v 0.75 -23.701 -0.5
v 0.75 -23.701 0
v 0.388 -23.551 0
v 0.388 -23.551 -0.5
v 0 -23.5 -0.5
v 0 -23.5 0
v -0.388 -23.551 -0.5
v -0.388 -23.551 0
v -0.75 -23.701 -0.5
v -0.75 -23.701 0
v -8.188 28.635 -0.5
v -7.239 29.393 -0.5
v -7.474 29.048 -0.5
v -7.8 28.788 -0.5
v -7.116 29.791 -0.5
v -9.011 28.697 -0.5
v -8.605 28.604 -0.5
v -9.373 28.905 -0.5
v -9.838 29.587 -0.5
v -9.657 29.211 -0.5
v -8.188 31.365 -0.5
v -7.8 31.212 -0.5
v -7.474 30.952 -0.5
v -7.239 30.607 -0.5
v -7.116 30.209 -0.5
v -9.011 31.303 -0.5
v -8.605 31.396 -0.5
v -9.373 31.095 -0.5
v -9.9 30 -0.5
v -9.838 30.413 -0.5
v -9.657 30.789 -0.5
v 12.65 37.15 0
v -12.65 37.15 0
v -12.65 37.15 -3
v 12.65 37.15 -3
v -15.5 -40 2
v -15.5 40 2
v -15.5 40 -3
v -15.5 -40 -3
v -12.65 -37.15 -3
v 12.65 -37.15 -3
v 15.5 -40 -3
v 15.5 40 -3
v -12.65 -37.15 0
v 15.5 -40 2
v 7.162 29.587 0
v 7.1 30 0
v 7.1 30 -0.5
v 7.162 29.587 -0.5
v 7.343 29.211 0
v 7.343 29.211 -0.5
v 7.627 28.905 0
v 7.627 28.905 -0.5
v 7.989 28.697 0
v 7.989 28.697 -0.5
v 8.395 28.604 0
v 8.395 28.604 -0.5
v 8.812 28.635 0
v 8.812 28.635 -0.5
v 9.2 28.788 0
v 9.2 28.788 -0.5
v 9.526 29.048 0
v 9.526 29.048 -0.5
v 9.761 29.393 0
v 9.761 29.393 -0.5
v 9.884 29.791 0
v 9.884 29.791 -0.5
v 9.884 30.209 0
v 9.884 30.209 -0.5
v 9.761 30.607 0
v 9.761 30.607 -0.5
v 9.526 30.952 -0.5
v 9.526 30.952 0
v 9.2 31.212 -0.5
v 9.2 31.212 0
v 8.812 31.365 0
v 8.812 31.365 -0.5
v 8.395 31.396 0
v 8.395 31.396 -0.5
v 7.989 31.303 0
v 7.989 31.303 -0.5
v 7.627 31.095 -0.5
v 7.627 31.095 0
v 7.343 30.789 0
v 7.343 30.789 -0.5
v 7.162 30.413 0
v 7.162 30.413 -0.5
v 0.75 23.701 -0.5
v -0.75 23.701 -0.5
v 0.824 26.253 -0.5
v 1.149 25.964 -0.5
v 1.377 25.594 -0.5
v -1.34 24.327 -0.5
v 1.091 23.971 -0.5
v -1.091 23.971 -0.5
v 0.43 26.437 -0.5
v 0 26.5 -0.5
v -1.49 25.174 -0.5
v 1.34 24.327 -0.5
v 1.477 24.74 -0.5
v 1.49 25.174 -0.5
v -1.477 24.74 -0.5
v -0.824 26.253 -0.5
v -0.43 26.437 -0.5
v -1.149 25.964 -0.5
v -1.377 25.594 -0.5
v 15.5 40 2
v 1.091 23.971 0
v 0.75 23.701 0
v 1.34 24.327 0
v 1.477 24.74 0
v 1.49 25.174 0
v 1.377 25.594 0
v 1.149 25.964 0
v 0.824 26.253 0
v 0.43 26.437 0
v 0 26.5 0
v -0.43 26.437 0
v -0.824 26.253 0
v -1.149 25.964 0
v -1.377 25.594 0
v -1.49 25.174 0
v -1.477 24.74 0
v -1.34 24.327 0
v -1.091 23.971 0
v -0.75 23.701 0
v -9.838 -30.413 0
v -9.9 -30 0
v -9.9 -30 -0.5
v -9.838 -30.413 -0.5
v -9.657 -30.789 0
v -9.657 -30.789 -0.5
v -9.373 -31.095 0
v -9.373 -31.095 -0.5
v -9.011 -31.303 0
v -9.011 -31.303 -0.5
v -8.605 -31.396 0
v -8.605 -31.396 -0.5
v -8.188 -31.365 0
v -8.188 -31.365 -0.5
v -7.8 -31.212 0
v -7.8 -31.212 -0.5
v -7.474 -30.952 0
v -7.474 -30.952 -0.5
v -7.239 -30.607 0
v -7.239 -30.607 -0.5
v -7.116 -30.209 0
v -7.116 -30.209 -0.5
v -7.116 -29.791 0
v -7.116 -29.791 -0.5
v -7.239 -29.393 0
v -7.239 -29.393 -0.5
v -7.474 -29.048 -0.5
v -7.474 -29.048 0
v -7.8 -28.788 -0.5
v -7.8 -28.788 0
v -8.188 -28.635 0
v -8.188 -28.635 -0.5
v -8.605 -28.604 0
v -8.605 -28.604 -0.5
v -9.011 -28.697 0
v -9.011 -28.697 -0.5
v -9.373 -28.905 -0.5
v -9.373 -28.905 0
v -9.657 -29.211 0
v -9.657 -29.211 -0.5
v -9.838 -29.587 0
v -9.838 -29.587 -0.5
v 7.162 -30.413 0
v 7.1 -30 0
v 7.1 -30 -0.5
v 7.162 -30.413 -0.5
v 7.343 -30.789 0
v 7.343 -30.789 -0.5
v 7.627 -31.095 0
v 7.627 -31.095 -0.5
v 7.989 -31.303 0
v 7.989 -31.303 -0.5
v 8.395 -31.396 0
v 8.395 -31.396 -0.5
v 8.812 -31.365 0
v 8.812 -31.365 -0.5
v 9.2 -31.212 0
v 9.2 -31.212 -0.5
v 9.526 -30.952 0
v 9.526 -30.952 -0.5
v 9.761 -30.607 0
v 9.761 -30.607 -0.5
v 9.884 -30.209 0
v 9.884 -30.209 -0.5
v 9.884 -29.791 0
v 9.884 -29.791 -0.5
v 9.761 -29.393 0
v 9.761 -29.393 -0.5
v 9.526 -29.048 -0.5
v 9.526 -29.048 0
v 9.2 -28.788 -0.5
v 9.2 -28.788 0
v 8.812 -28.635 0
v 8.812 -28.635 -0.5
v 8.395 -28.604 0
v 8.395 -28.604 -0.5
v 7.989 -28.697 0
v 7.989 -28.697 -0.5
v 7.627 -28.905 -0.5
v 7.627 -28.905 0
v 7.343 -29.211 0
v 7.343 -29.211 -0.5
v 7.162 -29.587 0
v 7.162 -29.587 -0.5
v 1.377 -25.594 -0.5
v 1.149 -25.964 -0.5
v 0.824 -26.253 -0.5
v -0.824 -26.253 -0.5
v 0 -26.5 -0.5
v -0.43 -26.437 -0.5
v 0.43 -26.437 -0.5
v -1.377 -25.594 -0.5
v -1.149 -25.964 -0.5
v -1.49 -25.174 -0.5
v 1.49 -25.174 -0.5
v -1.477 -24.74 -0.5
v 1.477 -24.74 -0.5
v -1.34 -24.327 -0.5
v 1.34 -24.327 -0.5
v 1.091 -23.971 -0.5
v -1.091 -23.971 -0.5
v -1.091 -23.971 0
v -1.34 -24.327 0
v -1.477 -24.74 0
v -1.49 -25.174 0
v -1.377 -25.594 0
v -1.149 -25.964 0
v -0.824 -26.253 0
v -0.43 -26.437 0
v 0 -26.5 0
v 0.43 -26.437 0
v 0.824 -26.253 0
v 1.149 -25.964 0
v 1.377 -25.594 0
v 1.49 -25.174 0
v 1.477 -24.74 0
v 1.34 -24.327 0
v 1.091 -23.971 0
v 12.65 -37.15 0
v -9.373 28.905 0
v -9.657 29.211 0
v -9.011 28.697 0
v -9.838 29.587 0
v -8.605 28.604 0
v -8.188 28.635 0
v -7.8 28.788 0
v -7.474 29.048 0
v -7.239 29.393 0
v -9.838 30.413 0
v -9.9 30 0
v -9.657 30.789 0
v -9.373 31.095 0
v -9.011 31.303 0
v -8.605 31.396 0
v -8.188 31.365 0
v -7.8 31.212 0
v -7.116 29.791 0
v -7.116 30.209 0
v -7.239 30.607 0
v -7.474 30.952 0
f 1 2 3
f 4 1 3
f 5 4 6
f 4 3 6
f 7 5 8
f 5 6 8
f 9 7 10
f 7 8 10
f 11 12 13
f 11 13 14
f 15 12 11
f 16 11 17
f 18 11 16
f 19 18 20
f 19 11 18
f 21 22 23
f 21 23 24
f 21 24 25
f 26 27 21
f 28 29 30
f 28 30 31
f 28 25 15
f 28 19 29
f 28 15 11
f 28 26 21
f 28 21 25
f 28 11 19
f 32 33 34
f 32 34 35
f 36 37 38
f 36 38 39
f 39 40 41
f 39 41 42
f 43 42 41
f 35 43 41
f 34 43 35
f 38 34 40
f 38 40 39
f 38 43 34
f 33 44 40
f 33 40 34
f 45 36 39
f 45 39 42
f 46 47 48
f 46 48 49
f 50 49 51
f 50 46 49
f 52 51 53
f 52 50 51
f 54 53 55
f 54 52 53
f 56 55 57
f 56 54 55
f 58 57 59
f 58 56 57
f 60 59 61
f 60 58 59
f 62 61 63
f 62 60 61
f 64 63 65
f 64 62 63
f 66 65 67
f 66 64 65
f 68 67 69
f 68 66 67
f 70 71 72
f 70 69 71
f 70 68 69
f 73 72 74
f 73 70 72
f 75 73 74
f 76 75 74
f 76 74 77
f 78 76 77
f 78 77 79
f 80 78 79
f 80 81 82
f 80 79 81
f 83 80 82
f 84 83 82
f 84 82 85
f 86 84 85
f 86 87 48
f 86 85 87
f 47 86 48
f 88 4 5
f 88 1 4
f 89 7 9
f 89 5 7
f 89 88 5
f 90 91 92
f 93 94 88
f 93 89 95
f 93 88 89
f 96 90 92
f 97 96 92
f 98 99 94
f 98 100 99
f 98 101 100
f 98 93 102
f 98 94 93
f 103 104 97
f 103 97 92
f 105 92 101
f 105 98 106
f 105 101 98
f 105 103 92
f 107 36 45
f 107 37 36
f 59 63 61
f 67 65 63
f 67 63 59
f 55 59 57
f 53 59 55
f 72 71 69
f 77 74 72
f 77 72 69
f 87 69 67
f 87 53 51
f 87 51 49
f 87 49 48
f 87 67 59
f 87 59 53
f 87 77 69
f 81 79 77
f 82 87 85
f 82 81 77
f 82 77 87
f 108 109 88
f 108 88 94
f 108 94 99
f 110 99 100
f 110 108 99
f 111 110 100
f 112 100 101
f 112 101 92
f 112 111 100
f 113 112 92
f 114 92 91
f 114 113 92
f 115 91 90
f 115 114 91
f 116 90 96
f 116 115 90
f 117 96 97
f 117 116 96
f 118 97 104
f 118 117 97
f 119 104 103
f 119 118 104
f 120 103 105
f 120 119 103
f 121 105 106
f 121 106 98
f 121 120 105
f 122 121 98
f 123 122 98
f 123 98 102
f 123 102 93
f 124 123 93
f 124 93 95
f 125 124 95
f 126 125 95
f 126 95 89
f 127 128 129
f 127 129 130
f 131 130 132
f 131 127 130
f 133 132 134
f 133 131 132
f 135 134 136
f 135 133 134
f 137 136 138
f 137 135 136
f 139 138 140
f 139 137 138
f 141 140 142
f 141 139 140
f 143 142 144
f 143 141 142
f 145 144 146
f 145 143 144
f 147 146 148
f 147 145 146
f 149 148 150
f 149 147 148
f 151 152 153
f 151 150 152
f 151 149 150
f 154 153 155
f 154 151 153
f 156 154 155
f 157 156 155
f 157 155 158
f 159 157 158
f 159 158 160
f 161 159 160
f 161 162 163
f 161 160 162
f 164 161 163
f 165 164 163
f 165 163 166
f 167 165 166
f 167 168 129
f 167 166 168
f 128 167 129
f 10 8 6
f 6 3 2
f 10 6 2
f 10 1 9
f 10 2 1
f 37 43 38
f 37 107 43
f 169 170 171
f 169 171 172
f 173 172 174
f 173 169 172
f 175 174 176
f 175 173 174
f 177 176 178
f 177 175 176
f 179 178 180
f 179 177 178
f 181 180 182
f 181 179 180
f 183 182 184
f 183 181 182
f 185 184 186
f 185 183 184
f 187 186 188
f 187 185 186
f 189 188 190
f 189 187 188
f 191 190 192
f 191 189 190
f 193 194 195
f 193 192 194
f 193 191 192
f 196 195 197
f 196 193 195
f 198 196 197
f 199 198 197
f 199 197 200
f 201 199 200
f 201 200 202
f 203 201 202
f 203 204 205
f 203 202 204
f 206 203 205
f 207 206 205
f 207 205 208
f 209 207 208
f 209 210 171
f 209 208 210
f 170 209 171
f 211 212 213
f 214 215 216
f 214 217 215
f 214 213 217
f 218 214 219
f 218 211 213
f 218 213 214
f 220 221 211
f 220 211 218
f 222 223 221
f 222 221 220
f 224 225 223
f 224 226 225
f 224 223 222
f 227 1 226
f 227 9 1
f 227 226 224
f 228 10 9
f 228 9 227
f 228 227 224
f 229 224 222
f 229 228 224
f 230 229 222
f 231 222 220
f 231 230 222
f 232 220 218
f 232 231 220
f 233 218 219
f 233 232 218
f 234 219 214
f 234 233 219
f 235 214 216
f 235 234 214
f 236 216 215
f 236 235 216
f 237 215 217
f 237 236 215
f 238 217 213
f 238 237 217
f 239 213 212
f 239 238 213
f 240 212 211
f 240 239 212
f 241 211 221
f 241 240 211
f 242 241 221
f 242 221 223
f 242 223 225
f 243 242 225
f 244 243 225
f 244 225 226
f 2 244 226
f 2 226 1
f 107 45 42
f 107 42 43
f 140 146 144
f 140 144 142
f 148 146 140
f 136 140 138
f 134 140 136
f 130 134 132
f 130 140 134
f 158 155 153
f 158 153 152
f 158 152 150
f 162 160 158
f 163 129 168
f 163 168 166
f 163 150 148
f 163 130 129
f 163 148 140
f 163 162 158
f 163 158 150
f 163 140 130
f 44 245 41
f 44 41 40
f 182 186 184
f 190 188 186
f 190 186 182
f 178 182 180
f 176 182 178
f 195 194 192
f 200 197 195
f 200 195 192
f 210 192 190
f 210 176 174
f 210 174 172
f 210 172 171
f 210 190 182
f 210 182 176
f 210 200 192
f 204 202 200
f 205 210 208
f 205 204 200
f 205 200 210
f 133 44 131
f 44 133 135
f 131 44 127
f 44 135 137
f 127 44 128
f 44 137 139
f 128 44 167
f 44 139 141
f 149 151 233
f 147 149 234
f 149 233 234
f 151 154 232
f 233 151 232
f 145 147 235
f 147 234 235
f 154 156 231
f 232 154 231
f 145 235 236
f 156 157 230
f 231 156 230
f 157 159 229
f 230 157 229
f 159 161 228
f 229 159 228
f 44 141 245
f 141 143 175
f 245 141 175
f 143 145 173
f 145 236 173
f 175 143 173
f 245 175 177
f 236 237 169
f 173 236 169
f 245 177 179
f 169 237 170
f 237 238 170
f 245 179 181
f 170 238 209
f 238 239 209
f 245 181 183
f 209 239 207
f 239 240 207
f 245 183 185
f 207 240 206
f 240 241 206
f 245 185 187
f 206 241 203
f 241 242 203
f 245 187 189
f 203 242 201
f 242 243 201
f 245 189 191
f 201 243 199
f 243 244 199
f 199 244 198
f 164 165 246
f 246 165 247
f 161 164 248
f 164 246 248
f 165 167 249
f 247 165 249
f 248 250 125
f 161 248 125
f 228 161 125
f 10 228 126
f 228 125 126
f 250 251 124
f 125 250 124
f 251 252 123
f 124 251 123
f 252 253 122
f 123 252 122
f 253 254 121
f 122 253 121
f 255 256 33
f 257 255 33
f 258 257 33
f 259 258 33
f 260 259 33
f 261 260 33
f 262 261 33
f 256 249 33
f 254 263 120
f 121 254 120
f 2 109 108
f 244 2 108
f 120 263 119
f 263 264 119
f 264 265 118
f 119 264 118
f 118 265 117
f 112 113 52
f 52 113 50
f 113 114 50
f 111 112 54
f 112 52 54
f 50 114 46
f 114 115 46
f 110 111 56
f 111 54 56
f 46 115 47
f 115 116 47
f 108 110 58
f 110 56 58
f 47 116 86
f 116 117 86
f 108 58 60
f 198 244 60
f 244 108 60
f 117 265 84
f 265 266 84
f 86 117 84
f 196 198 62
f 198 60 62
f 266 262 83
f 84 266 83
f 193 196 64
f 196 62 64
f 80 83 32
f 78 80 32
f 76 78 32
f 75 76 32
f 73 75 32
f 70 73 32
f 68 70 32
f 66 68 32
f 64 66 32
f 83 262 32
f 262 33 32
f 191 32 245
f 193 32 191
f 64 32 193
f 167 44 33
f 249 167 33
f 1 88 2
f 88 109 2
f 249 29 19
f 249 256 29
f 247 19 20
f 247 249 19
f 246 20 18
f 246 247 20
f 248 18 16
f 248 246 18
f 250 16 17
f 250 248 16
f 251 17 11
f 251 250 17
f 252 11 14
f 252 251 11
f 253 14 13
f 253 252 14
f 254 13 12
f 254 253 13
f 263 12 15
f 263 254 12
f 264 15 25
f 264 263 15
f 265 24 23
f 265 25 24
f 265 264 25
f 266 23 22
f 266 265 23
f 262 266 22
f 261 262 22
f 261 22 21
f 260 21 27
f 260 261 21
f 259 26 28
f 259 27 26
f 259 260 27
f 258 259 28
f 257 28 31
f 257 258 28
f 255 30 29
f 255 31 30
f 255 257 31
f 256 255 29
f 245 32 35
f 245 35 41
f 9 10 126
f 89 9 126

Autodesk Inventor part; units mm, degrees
ref_plane "YZ Plane" through (0, 0, 0) normal (1, 0, 0) x (0, 1, 0)
ref_plane "XZ Plane" through (0, 0, 0) normal (0, 1, 0) x (-1, 0, 0)
ref_plane "Arbeitsebene1" through (0, 0, 0) normal (0, 0, 1) x (1, 0, 0)
sketch "Skizze1" plane through (0, 0, 0) normal (0, 0, 1) x (1, 0, 0)
  line L0 (12.5, -37) -> (-12.5, -37) projected
  line L1 (12.5, 37) -> (12.5, -37) projected
  line L2 (-12.5, 37) -> (12.5, 37) projected
  line L3 (-12.5, -37) -> (-12.5, 37) projected
  circle A0 centre (-8.5, -30) radius 1.4 projected
  circle A1 centre (8.5, -30) radius 1.4 projected
  circle A2 centre (8.5, 30) radius 1.4 projected
  circle A3 centre (-8.5, 30) radius 1.4 projected
  line L4 (-0.75, 23.146) -> (-0.75, -23.146) projected
  arc A4 (0.75, 23.146) -> (-0.75, 23.146) centre (0, 25) ccw projected
  line L5 (0.75, -23.146) -> (0.75, 23.146) projected
  arc A5 (-0.75, -23.146) -> (0.75, -23.146) centre (0, -25) ccw projected
  line L6 (15.5, -40) -> (-15.5, -40)
  line L7 (-15.5, -40) -> (-15.5, 40)
  line L8 (-15.5, 40) -> (15.5, 40)
  line L9 (15.5, 40) -> (15.5, -40)
  point P0 (0, 0)
  dimension "d0" = 3
extrude "Extrusion1" add sketch "Skizze1" along normal blind 2 contours L0 L3 L2 L1 | A0 | A1 | A2 | A3 | A4 L5 A5 L4 | L6 L7 L8 L9
ref_plane "Arbeitsebene2" through (-2, 9.25, -0.4) normal (0, 0, 1) x (1, 0, 0)
sketch "Skizze2" plane through (0, 0, 0) normal (0, 0, -1) x (-1, 0, 0)
  circle A0 centre (0, -25) radius 2.5 construction
  circle A1 centre (0, 25) radius 2.5 construction
  line L0 (12.5, -37) -> (12.5, 37)
  line L1 (12.5, 37) -> (-12.5, 37)
  line L2 (-12.5, 37) -> (-12.5, -37)
  line L3 (-12.5, -37) -> (12.5, -37)
  circle A2 centre (8.5, -30) radius 1.4
  circle A3 centre (-8.5, -30) radius 1.4
  circle A4 centre (-8.5, 30) radius 1.4
  circle A5 centre (8.5, 30) radius 1.4
  line L4 (0.75, -7.25) -> (0.75, -23.146) construction
  line L5 (-0.75, 7.25) -> (-0.75, 23.146) construction
  line L6 (0.75, -7.25) -> (0.75, -23.146) construction
  line L7 (-0.75, 7.25) -> (-0.75, 23.146) construction
  circle A6 centre (0, -25) radius 2.5 construction
  circle A7 centre (0, 25) radius 2.5 construction
  circle A8 centre (0, 25) radius 32.2587 construction
  circle A9 centre (0, -25) radius 2 construction
  circle A10 centre (0, 25) radius 1.5
  circle A11 centre (0, -25) radius 1.5
  line L8 (0.75, 23.701) -> (-0.75, 23.701)
  line L9 (-0.75, 23.701) -> (-0.75, -23.701)
  line L10 (-0.75, -23.701) -> (0.75, -23.701)
  line L11 (0.75, -23.701) -> (0.75, 23.701)
  line L12 (-9.25, 9.25) -> (9.25, 9.25)
  line L13 (9.25, 9.25) -> (9.25, -9.25)
  line L14 (9.25, -9.25) -> (-9.25, -9.25)
  line L15 (-9.25, -9.25) -> (-9.25, 9.25)
  point P0 (0, 0)
  point P1 (-0.75, 22.6152)
  point P2 (-0.75, -22.6152)
  point P3 (0.75, -22.6152)
  point P4 (0.75, 22.6152)
  point P5 (-0.75, -23.146)
extrude "Extrusion2" add sketch "Skizze2" along normal blind 0.5 contours A2 | A3 | A4 | A5 | A10 L8 | L8 A10 | A10 L11 L12 L9 | L12 L11 L14 L9 | L14 L11 A11 L9 | L10 A11 picked at (0.3855, -25.1784)
sketch "Skizze4" plane through (0, 0, 0) normal (0, 0, -1) x (-1, 0, 0)
  circle A0 centre (8.5, -30) radius 1.4 projected
  circle A1 centre (-8.5, 30) radius 1.4 projected
  arc A2 (0.75, 23.701) -> (-0.75, 23.701) centre (0, 25) ccw projected
  line L0 (0.75, 23.701) -> (0.75, -23.701) projected
  arc A3 (-0.75, -23.701) -> (0.75, -23.701) centre (0, -25) ccw projected
  line L1 (-0.75, -23.701) -> (-0.75, 23.701) projected
  circle A4 centre (-8.5, -30) radius 1.4 projected
  circle A5 centre (8.5, 30) radius 1.4 projected
  line L2 (-15.5, 40) -> (15.5, 40) projected
  line L3 (-15.5, -40) -> (-15.5, 40) projected
  line L4 (15.5, -40) -> (-15.5, -40) projected
  line L5 (15.5, 40) -> (15.5, -40) projected
  line L6 (12.65, 37.15) -> (-12.65, 37.15)
  line L7 (-12.65, 37.15) -> (-12.65, -37.15)
  line L8 (-12.65, -37.15) -> (12.65, -37.15)
  line L9 (12.65, -37.15) -> (12.65, 37.15)
  point P0 (0, 0)
  dimension "d11" = 2.85
extrude "Extrusion4" add sketch "Skizze4" along normal blind 3 contours L2 L5 L4 L3
properties part number "40_microfluidic_chip_lightsheet_layer1_negative_mould_upper_v0"
